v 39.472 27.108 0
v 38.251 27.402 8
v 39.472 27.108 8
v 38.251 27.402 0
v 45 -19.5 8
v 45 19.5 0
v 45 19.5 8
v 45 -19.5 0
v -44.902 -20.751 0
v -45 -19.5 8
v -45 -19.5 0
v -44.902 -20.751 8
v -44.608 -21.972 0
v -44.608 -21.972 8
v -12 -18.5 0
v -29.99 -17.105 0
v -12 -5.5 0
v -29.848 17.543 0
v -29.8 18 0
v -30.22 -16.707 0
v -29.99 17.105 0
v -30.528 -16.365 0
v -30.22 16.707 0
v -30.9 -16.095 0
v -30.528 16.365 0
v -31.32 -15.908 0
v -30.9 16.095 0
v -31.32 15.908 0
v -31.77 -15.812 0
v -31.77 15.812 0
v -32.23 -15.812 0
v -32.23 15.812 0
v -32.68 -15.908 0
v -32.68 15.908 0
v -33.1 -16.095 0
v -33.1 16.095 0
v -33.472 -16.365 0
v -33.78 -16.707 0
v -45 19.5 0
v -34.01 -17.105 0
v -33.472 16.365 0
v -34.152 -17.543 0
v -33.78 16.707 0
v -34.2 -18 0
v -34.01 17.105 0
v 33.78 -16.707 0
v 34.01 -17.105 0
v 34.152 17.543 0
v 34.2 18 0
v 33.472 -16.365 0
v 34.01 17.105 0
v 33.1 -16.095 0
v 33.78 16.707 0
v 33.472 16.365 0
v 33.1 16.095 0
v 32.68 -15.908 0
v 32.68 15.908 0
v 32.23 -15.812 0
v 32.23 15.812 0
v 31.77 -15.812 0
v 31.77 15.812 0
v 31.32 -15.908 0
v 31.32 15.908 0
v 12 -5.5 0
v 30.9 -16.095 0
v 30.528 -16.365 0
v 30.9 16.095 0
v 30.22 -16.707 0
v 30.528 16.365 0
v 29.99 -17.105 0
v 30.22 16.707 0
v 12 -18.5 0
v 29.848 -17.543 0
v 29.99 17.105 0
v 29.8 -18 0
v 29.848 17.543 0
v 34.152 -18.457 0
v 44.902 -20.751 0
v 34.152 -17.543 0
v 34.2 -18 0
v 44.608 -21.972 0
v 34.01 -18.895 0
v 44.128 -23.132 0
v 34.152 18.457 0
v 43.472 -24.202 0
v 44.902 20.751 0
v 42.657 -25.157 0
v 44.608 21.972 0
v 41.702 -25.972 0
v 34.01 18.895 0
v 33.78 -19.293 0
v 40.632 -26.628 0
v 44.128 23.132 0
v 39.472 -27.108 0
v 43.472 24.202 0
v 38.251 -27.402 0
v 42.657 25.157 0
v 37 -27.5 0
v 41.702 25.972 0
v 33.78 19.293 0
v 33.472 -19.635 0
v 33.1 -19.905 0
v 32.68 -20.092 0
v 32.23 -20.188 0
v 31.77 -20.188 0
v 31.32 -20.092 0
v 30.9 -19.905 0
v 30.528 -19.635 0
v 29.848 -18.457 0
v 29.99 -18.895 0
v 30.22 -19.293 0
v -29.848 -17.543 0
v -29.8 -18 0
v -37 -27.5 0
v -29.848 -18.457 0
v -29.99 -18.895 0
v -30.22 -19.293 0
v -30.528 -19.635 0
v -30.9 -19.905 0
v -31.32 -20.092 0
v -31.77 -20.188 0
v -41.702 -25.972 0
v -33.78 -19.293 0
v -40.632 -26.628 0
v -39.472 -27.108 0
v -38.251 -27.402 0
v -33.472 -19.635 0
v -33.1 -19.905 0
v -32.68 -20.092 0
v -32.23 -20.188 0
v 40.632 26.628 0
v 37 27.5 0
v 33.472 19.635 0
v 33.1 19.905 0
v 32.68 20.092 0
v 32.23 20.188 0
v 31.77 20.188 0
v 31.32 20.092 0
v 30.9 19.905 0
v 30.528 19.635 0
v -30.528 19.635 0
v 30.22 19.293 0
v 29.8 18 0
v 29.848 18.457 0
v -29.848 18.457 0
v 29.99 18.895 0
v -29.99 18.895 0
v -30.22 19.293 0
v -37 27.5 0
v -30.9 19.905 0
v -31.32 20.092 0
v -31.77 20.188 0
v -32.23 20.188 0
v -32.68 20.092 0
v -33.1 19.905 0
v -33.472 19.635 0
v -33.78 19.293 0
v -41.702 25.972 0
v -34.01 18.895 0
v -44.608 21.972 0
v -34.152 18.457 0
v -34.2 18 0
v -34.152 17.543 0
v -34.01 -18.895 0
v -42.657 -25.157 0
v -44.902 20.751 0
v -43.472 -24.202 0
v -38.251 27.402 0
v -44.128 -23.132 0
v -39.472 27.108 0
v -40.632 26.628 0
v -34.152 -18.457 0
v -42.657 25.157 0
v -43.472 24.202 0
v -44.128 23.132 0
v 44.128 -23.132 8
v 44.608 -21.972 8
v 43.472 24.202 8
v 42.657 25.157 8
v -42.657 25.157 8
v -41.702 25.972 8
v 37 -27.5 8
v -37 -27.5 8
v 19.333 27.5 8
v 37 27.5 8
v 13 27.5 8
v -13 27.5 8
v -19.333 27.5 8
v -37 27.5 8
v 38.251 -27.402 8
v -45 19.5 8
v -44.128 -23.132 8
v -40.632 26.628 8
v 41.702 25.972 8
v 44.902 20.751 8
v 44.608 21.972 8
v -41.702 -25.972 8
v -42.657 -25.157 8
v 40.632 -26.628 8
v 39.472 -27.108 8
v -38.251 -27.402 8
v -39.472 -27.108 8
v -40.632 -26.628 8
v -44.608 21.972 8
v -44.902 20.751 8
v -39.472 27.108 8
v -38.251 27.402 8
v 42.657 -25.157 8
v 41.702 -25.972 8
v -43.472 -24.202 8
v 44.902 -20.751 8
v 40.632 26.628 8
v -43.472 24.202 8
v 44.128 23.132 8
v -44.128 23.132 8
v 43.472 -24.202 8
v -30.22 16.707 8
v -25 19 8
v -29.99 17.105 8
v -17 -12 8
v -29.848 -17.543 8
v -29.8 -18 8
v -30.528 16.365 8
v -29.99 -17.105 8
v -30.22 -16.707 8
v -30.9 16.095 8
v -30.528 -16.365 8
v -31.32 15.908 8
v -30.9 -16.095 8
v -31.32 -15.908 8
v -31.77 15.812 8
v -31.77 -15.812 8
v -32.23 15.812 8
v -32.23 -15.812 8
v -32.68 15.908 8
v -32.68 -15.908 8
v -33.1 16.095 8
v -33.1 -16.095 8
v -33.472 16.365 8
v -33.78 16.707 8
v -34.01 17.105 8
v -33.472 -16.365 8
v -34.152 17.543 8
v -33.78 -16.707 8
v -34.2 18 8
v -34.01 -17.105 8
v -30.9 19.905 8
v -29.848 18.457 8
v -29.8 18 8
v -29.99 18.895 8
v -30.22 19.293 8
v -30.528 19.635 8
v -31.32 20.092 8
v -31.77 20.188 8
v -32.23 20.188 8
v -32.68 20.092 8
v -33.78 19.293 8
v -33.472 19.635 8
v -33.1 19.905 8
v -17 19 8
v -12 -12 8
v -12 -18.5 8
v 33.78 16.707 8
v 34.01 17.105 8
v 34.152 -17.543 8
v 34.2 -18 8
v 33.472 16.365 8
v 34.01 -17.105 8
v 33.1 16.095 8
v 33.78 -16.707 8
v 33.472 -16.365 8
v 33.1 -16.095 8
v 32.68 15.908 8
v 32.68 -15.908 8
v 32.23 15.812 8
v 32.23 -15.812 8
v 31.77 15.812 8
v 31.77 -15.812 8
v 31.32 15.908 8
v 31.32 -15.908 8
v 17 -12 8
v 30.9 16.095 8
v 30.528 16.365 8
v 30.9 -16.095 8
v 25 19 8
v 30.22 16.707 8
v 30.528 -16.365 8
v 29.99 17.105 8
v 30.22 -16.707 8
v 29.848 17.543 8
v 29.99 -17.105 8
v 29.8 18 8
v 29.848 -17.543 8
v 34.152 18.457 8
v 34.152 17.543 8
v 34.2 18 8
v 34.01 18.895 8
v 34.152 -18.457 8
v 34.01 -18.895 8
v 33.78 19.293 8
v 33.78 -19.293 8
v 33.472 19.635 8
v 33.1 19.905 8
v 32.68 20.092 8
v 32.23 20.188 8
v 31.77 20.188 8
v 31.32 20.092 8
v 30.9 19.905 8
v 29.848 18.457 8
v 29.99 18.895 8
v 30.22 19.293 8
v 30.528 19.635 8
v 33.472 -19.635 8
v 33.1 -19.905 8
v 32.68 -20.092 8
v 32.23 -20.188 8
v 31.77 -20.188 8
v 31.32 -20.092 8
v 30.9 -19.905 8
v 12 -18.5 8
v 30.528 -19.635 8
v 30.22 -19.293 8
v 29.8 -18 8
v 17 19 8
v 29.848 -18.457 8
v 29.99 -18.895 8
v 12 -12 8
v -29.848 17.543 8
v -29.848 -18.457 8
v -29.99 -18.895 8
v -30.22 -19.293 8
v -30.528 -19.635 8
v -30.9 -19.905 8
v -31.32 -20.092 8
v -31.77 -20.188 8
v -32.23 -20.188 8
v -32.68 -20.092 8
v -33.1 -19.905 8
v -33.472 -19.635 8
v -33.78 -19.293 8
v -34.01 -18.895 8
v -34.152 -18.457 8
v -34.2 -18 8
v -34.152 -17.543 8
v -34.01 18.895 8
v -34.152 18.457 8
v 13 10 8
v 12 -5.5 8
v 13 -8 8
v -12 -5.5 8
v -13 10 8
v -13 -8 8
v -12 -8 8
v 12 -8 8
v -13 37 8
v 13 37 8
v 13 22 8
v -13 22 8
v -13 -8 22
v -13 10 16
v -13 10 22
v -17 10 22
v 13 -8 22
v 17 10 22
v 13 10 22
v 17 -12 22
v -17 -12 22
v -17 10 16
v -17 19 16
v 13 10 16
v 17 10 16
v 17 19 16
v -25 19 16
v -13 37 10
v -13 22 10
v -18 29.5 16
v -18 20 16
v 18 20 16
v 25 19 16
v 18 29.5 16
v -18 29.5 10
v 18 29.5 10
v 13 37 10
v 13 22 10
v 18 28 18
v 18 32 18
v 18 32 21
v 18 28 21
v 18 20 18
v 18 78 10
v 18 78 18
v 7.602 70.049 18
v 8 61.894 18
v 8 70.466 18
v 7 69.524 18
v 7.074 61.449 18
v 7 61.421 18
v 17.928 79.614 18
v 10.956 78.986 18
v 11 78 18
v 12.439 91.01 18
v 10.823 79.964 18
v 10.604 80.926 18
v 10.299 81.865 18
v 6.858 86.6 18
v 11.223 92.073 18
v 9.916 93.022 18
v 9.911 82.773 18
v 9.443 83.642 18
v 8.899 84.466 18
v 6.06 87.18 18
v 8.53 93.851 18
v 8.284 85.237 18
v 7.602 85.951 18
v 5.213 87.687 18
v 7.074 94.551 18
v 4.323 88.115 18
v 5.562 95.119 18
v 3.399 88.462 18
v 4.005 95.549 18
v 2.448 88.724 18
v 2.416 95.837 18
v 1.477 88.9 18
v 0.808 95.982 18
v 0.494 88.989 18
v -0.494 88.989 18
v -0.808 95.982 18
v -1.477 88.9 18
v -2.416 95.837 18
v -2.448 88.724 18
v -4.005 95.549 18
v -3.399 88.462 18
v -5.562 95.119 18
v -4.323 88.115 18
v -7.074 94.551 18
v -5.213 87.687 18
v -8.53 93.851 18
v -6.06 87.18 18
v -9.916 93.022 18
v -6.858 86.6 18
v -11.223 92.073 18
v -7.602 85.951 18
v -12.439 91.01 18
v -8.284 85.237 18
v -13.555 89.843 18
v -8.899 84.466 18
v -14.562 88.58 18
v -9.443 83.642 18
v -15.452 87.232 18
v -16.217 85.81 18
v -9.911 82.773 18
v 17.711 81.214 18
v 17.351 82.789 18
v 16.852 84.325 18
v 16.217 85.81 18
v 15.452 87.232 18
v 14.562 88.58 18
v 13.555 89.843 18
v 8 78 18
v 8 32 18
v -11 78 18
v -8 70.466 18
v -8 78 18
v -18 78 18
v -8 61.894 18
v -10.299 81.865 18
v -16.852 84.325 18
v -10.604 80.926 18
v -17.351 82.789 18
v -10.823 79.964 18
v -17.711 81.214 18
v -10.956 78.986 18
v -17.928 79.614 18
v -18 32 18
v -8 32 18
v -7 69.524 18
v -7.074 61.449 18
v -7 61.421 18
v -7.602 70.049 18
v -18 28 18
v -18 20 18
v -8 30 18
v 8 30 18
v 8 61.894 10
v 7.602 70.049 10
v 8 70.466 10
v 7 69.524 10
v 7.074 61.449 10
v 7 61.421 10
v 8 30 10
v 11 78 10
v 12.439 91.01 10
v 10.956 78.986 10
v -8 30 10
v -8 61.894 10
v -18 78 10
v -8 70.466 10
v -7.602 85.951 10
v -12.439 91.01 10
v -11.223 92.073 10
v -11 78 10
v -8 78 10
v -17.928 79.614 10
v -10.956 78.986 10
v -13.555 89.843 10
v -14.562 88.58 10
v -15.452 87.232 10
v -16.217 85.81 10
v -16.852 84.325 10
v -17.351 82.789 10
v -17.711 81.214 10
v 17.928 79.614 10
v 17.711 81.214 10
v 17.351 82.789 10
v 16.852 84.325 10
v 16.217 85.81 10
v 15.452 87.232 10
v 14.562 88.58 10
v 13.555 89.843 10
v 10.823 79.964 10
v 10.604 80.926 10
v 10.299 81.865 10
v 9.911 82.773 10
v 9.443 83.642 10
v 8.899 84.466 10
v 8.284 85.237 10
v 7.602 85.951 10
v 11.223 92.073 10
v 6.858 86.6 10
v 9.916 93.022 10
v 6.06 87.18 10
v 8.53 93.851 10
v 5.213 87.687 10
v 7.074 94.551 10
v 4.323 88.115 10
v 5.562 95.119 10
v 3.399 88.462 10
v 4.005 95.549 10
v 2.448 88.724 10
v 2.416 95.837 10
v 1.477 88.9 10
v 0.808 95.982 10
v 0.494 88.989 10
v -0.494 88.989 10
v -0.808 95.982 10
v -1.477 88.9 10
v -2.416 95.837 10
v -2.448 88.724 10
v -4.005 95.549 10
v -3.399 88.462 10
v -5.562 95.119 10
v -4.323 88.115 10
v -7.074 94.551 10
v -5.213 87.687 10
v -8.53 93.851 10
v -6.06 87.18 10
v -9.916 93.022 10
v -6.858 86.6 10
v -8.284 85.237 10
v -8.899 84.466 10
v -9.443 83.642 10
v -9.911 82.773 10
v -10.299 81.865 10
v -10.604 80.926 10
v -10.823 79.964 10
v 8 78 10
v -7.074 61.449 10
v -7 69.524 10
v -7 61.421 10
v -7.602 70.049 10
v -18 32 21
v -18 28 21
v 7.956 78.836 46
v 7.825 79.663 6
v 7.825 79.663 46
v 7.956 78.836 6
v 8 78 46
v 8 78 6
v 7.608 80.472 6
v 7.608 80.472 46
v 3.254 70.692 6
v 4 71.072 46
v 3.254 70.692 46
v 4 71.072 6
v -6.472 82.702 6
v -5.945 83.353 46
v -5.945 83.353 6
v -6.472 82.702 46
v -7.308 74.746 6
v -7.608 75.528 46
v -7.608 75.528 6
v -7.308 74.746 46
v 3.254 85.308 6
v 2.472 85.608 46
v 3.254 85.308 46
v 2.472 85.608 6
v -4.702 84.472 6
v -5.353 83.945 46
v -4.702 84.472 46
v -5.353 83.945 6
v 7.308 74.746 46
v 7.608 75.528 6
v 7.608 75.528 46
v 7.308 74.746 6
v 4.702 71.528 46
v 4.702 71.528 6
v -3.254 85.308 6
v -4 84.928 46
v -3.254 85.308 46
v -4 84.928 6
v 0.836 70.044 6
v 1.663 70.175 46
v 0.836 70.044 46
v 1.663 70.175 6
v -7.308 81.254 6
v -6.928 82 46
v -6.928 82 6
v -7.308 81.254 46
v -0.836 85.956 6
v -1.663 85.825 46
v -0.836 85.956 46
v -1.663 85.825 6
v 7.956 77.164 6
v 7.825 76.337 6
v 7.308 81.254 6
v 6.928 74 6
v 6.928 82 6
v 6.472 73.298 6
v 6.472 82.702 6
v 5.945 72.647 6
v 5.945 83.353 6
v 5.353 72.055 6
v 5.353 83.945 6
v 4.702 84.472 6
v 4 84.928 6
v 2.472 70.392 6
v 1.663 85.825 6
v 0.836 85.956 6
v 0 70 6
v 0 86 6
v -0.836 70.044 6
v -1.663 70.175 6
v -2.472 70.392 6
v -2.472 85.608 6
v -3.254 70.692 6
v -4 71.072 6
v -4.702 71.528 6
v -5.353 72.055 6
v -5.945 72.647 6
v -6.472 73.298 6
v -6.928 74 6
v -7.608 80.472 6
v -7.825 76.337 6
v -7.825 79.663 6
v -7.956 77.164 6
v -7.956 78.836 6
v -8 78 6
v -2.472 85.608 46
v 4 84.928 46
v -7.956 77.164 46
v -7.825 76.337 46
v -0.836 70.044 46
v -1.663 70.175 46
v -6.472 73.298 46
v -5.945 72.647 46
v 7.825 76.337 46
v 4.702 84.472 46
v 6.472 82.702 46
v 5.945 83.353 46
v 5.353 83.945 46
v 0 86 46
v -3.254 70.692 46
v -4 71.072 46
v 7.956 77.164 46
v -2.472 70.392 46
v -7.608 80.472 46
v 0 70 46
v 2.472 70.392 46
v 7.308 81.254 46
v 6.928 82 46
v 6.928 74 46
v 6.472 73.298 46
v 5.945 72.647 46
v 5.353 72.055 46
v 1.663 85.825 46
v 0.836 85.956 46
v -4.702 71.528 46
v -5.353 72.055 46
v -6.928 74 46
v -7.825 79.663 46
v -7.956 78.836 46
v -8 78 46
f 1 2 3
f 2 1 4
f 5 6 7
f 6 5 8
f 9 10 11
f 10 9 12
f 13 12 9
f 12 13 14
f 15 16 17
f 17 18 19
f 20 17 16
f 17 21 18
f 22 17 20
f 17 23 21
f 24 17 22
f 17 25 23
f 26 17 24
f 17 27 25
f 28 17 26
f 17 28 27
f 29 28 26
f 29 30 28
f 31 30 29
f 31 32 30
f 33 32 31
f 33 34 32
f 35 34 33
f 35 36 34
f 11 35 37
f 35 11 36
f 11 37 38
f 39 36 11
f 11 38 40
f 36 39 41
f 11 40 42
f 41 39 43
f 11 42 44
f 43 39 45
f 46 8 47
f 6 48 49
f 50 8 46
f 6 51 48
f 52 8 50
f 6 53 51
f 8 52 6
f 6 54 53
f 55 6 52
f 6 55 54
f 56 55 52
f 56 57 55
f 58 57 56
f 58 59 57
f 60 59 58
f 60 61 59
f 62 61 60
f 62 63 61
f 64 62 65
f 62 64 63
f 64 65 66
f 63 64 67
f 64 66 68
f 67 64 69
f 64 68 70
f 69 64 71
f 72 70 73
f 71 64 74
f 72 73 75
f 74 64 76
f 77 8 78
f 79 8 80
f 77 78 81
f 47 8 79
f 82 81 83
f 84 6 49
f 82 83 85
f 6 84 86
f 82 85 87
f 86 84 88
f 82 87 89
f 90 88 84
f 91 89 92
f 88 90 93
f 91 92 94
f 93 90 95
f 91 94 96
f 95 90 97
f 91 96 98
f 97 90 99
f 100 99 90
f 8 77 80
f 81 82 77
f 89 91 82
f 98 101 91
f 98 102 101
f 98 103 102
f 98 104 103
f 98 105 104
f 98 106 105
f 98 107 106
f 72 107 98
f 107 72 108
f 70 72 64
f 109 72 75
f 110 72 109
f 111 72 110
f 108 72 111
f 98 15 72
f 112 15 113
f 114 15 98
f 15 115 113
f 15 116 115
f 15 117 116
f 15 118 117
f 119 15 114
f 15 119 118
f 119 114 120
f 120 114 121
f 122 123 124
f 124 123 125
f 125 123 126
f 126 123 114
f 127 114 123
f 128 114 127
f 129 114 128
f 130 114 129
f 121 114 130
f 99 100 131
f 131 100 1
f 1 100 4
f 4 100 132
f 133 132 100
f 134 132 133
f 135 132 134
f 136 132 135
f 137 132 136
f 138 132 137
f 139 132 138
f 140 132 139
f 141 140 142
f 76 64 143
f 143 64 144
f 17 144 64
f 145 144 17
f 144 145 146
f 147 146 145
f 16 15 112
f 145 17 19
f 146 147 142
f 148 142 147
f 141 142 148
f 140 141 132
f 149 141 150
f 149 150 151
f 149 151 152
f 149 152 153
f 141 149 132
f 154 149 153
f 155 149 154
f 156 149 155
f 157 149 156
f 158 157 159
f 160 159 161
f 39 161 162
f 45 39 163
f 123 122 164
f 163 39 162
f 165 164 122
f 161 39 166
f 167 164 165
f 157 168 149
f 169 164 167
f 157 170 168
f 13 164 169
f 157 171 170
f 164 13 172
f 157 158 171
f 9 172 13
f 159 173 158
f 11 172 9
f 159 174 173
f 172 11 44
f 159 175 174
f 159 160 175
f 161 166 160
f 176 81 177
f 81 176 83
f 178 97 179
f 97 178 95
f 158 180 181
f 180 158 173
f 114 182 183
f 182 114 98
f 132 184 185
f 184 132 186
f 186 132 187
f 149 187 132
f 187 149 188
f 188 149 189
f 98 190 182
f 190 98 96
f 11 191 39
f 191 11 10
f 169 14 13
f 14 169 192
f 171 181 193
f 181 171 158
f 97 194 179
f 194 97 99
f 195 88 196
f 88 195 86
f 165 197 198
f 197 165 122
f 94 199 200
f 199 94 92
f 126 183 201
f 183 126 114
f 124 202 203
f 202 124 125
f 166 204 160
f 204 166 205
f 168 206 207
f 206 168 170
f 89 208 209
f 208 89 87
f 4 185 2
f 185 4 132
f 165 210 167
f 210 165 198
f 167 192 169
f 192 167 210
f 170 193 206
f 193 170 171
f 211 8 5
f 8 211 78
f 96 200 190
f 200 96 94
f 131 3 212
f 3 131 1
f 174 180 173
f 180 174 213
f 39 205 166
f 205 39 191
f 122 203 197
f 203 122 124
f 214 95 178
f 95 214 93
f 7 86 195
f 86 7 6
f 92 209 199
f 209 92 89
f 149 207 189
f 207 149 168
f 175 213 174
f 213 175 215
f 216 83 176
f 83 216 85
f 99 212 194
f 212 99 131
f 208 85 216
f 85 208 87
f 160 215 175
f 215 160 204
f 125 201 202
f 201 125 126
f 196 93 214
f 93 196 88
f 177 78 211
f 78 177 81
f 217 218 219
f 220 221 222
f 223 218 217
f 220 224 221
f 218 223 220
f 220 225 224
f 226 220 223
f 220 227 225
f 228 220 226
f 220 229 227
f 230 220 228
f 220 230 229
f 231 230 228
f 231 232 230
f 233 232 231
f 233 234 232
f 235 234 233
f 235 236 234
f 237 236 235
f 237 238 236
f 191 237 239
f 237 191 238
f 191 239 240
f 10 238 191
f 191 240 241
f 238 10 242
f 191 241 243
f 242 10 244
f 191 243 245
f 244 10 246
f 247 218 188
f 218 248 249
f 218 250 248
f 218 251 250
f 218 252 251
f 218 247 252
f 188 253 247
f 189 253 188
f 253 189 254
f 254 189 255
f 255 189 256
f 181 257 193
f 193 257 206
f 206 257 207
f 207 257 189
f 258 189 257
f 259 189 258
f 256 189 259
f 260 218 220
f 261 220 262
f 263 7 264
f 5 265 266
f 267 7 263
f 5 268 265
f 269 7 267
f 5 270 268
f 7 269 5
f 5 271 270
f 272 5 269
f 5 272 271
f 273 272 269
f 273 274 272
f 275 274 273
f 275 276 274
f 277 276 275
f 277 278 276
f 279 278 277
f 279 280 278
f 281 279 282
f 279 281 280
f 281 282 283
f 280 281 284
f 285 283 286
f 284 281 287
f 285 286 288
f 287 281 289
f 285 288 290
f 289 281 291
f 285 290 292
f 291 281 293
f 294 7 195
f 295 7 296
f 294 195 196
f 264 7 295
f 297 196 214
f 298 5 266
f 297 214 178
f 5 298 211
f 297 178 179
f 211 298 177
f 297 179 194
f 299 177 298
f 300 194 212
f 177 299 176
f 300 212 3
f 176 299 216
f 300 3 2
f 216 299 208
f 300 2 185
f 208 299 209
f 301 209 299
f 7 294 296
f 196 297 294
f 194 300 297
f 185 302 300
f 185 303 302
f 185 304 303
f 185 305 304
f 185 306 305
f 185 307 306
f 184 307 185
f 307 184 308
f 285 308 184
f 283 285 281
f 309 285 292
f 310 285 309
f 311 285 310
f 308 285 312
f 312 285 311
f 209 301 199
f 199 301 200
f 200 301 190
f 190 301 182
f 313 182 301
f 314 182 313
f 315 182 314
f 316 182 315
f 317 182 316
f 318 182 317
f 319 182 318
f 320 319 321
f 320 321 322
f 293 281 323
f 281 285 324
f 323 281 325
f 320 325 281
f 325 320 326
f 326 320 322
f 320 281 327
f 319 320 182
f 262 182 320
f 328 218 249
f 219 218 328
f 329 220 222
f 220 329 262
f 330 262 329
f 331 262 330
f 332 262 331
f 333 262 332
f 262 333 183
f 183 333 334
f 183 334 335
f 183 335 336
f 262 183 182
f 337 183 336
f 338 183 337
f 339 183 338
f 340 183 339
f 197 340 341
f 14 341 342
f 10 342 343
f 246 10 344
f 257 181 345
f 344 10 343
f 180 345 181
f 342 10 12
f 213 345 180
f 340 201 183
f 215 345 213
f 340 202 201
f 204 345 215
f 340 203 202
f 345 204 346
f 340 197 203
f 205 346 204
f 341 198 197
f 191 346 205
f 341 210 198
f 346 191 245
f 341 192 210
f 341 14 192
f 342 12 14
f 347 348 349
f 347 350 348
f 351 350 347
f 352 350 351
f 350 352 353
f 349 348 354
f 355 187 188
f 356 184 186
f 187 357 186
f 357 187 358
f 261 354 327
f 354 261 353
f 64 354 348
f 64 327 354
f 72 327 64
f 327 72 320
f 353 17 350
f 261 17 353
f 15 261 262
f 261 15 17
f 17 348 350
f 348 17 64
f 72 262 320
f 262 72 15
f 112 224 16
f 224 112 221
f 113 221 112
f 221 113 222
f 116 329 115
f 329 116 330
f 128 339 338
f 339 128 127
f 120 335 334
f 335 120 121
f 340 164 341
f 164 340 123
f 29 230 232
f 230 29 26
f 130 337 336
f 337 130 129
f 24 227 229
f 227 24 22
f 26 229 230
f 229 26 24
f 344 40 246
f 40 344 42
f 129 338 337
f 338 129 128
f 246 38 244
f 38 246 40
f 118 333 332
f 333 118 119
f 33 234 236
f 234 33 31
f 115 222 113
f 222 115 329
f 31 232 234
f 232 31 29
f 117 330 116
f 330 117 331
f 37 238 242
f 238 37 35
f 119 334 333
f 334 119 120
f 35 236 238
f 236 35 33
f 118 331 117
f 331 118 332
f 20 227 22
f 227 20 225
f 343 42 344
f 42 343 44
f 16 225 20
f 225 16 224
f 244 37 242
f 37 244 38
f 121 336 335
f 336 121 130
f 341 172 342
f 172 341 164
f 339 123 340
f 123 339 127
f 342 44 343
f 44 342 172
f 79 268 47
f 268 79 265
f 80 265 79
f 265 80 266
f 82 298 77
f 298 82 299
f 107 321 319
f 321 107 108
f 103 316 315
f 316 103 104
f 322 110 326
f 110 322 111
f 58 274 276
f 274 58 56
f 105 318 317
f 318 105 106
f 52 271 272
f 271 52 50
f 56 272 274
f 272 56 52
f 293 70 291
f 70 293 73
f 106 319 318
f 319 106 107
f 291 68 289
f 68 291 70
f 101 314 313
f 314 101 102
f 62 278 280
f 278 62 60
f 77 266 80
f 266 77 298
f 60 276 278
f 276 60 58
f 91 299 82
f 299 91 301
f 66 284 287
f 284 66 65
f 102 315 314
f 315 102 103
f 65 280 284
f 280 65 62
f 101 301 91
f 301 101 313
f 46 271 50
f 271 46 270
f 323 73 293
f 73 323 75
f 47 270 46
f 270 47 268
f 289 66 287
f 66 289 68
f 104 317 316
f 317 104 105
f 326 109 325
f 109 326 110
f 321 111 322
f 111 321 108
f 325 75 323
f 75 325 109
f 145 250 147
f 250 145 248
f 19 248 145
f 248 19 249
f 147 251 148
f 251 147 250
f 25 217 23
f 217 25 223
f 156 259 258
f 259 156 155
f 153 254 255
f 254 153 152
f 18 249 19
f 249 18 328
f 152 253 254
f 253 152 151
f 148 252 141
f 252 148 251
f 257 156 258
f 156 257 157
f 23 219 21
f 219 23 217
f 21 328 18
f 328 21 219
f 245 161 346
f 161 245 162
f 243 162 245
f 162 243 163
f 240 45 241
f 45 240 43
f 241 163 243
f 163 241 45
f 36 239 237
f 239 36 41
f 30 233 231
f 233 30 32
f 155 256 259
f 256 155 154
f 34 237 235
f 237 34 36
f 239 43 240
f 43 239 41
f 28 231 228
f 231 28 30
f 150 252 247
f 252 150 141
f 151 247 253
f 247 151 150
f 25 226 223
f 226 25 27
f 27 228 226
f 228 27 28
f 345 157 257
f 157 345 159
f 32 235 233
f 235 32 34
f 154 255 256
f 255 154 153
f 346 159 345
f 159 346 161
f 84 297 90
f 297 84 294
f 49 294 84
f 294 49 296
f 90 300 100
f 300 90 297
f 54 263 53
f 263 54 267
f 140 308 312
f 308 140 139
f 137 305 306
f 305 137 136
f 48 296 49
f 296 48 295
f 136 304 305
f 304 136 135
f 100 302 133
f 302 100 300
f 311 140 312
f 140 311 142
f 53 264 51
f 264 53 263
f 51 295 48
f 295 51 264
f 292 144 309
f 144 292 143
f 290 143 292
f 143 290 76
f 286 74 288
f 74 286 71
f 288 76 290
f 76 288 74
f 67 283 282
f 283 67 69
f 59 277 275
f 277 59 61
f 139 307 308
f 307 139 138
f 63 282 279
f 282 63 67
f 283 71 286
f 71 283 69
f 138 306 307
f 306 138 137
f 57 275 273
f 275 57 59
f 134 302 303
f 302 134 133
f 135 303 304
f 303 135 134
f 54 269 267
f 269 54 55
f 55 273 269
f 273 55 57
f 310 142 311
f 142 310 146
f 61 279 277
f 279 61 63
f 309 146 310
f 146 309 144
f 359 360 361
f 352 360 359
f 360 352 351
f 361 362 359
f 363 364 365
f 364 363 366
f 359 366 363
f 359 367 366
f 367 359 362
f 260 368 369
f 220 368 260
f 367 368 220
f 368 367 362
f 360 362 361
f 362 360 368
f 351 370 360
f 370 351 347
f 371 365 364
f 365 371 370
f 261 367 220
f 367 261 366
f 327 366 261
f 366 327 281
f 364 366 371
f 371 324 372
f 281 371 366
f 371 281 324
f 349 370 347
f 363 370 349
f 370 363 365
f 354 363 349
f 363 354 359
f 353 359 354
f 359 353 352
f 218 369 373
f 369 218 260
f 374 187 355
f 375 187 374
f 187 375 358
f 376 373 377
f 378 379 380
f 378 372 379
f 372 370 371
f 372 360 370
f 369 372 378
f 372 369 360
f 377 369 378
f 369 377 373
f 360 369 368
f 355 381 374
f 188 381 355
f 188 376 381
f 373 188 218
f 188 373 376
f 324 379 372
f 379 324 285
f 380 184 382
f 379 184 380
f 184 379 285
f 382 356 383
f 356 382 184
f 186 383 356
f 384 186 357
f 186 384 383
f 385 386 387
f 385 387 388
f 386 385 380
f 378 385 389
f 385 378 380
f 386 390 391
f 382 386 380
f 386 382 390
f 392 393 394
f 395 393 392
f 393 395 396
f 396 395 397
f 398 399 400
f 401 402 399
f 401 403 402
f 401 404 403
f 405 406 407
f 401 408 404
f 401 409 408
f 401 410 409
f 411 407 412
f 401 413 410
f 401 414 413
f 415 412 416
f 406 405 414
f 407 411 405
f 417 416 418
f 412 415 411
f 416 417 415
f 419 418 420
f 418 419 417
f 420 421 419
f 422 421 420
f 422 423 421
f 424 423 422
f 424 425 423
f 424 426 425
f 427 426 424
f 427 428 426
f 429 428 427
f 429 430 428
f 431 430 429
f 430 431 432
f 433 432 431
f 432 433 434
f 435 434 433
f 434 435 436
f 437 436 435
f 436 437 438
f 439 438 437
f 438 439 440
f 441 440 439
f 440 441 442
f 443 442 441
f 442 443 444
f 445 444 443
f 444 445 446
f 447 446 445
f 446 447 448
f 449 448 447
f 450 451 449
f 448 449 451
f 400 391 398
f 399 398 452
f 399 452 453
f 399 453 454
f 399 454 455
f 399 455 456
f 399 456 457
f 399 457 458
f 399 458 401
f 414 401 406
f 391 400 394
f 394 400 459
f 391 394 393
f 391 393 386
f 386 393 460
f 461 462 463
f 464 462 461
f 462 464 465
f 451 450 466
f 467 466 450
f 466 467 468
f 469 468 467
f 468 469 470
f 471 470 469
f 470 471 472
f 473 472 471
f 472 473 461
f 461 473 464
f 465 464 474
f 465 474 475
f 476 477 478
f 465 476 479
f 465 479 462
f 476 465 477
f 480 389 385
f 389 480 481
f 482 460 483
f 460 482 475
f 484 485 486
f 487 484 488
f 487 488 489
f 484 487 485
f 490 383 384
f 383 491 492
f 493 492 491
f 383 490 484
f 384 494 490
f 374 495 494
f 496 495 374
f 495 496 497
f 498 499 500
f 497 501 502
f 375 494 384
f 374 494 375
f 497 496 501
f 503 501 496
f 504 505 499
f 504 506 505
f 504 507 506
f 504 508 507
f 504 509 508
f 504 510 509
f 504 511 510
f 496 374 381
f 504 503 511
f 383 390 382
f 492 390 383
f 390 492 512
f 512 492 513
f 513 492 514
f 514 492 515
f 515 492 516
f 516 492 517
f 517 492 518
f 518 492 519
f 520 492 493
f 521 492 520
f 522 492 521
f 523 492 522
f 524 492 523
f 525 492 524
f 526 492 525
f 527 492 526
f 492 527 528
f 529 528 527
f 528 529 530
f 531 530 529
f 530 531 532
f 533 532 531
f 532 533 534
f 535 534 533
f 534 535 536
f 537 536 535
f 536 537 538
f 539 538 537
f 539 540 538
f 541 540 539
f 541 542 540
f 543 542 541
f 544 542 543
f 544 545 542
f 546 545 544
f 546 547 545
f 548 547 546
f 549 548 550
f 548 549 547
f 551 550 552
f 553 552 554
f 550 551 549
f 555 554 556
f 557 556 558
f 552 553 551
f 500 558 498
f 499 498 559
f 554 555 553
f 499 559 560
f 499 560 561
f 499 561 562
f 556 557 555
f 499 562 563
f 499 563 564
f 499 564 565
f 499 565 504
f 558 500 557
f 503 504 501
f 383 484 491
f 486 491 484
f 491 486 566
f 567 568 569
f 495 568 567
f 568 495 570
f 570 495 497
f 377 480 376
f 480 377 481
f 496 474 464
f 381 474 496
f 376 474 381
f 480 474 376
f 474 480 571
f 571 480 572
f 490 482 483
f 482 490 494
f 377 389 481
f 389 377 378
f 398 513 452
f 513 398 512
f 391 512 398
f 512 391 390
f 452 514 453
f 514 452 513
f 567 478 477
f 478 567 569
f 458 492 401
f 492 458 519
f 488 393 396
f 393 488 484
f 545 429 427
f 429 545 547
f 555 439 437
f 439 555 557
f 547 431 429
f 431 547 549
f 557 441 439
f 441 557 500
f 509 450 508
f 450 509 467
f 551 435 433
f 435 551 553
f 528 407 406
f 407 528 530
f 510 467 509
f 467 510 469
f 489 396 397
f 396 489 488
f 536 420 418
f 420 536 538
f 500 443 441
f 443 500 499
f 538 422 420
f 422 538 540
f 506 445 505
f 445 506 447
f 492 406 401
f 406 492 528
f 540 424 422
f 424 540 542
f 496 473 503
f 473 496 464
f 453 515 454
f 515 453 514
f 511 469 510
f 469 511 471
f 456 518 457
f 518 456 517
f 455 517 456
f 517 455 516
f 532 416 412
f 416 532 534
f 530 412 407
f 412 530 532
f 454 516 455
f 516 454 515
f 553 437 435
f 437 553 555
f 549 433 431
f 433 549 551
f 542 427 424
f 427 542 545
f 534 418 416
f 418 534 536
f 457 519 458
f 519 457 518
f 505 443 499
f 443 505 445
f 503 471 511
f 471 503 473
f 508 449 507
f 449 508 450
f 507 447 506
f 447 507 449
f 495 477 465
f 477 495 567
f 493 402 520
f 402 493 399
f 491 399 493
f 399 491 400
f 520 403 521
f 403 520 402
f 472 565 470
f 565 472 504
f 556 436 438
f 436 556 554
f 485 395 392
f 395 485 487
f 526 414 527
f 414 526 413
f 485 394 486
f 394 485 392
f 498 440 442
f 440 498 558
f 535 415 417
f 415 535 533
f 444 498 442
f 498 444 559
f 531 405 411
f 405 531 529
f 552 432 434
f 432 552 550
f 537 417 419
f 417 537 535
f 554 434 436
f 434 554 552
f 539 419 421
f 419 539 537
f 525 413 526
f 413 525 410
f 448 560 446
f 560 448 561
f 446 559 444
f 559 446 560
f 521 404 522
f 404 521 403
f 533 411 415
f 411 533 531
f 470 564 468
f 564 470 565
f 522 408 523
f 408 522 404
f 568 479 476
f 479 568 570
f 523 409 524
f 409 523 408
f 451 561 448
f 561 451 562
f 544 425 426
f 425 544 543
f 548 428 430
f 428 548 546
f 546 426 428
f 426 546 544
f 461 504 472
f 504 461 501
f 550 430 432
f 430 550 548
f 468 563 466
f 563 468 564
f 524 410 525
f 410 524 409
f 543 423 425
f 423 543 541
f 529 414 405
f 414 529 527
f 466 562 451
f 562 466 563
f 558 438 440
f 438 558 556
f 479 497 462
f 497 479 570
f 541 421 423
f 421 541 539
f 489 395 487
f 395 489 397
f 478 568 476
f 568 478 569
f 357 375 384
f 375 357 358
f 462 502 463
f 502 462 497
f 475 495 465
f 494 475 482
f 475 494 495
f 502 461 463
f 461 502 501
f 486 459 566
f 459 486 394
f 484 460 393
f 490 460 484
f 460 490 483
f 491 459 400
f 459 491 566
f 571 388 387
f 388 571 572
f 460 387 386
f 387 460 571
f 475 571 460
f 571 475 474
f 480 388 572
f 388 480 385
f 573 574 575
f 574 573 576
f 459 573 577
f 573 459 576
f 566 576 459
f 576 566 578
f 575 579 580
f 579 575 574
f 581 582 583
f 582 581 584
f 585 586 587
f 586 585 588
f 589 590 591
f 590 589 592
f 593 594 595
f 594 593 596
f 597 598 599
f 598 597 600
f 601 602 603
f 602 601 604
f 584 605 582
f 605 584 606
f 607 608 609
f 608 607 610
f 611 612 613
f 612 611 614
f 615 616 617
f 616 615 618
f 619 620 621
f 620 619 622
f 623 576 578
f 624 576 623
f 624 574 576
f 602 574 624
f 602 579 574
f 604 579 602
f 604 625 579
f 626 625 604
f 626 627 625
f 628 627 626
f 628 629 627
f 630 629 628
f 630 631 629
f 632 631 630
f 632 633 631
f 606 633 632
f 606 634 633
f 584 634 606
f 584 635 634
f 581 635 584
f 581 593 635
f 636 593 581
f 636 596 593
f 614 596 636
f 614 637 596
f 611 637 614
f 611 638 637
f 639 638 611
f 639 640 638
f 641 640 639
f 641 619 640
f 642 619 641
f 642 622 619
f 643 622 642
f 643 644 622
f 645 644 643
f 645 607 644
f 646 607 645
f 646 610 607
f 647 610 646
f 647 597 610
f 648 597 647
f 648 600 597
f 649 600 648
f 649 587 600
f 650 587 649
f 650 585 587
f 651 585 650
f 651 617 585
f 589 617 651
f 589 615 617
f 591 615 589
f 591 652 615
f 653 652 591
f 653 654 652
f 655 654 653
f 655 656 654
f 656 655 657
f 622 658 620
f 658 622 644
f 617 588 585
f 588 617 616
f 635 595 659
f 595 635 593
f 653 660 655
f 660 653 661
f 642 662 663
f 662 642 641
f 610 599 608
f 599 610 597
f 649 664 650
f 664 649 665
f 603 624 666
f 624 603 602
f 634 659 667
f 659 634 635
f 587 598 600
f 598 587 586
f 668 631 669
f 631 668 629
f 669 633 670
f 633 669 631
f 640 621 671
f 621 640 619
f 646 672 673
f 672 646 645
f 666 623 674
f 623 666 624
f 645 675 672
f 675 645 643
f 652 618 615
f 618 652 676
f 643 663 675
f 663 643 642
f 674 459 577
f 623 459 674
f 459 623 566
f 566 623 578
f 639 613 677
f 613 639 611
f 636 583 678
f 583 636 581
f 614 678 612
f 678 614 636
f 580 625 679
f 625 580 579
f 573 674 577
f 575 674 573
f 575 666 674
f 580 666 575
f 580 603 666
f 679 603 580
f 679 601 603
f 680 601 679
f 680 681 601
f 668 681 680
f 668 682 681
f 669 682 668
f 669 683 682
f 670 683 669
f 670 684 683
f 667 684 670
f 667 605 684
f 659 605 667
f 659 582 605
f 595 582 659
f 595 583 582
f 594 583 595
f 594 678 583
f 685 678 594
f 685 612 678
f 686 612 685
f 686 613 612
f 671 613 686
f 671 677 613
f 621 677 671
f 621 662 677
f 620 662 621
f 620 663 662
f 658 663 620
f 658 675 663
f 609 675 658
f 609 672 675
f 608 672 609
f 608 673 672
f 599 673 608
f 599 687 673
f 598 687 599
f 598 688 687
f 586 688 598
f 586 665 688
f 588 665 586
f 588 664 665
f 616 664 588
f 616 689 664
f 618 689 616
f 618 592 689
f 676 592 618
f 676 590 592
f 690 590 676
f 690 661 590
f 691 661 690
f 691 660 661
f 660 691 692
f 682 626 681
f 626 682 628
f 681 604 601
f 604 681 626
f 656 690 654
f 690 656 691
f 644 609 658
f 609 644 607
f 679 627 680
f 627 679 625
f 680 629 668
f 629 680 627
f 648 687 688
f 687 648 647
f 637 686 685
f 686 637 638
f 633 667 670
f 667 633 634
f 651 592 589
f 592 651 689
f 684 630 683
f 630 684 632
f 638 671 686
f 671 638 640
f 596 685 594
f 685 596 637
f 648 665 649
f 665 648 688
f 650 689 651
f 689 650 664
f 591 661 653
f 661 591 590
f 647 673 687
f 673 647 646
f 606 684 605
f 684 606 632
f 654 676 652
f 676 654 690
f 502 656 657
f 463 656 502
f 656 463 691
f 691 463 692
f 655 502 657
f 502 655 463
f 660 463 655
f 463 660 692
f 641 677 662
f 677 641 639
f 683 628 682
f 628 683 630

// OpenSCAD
// Bio-Orbit Labs - Microgravity Sample Retrieval Clamp
// Garra robótica paramétrica para coleta de amostras em bioreator orbital

// VARIÁVEIS PARAMÉTRICAS

base_x = 90;
base_y = 55;
base_z = 8;

servo_x = 24;
servo_y = 13;
servo_z = 13;

arm_length = 58;
arm_width = 10;
arm_height = 8;
arm_gap = 26;

jaw_radius_outer = 18;
jaw_radius_inner = 11;
jaw_height = 8;

support_width = 34;
support_length = 12;
support_height = 8;

hole_radius = 2.2;

// BASE ARREDONDADA

module rounded_base() {

    difference() {

        hull() {

            translate([-base_x/2 + 8, -base_y/2 + 8, 0])
                cylinder(h=base_z, r=8, $fn=40);

            translate([base_x/2 - 8, -base_y/2 + 8, 0])
                cylinder(h=base_z, r=8, $fn=40);

            translate([-base_x/2 + 8, base_y/2 - 8, 0])
                cylinder(h=base_z, r=8, $fn=40);

            translate([base_x/2 - 8, base_y/2 - 8, 0])
                cylinder(h=base_z, r=8, $fn=40);
        }

        // encaixe para microservo 9g
        translate([0, -12, base_z - 3])
            cube([servo_x, servo_y, servo_z], center=true);

        // furos de fixação
        translate([-32, -18, -1])
            cylinder(h=base_z+2, r=hole_radius, $fn=30);

        translate([32, -18, -1])
            cylinder(h=base_z+2, r=hole_radius, $fn=30);

        translate([-32, 18, -1])
            cylinder(h=base_z+2, r=hole_radius, $fn=30);

        translate([32, 18, -1])
            cylinder(h=base_z+2, r=hole_radius, $fn=30);
    }
}

// SUPORTE DO SERVO

module servo_mount_walls() {

    // parede esquerda
    translate([-17, -12, base_z])
        cube([4, 22, 14], center=false);

    // parede direita
    translate([13, -12, base_z])
        cube([4, 22, 14], center=false);

    // parede traseira
    translate([-17, -12, base_z])
        cube([34, 4, 14], center=false);
}

// PESCOÇO CENTRAL

module central_neck() {

    translate([-support_width/2, 10, base_z])
        cube([support_width, support_length, support_height], center=false);
}

// BRAÇO ESQUERDO

module left_arm() {

    translate([-arm_gap/2 - arm_width/2, 20, base_z + 2])
        cube([arm_width, arm_length, arm_height], center=false);
}

// BRAÇO DIREITO

module right_arm() {

    translate([arm_gap/2 - arm_width/2, 20, base_z + 2])
        cube([arm_width, arm_length, arm_height], center=false);
}

// GARRA FRONTAL

module front_ring() {

    translate([0, 20 + arm_length, base_z + 2])

        difference() {

            cylinder(h=jaw_height, r=jaw_radius_outer, $fn=70);

            translate([0, 0, -1])
                cylinder(h=jaw_height + 2, r=jaw_radius_inner, $fn=70);

            // abertura frontal
            translate([-7, -jaw_radius_outer - 2, -1])
                cube([14, 16, jaw_height + 2], center=false);
        }
}

// REFORÇOS ESTRUTURAIS

module reinforced_joints() {

    // reforço esquerdo
    translate([-25, 19, base_z])

        linear_extrude(height=8)

            polygon(points=[[0,0],[12,0],[12,18]]);

    // reforço direito
    translate([25, 19, base_z])

        mirror([1,0,0])

            linear_extrude(height=8)

                polygon(points=[[0,0],[12,0],[12,18]]);

    // ponte traseira
    translate([-arm_gap/2 - arm_width/2, 20, base_z + 2])

        cube([arm_gap + arm_width, 10, arm_height], center=false);
}

// TUBO BIOLÓGICO ORBITAL

module sample_tube_visual() {

    // tubo orbital azul

    color([0.2, 0.8, 1.0])

    translate([0, 20 + arm_length, base_z + 18])

        cylinder(h=40, r=8, center=true, $fn=60);
}

// MODELO PRINCIPAL

module bio_orbit_clamp() {

    union() {

        rounded_base();

        servo_mount_walls();

        central_neck();

        reinforced_joints();

        left_arm();

        right_arm();

        front_ring();

        // detalhe superior orbital
        translate([-18, 28, base_z + 10])

            cube([36, 4, 3], center=false);
    }
}

// RENDER FINAL

bio_orbit_clamp();

sample_tube_visual();
